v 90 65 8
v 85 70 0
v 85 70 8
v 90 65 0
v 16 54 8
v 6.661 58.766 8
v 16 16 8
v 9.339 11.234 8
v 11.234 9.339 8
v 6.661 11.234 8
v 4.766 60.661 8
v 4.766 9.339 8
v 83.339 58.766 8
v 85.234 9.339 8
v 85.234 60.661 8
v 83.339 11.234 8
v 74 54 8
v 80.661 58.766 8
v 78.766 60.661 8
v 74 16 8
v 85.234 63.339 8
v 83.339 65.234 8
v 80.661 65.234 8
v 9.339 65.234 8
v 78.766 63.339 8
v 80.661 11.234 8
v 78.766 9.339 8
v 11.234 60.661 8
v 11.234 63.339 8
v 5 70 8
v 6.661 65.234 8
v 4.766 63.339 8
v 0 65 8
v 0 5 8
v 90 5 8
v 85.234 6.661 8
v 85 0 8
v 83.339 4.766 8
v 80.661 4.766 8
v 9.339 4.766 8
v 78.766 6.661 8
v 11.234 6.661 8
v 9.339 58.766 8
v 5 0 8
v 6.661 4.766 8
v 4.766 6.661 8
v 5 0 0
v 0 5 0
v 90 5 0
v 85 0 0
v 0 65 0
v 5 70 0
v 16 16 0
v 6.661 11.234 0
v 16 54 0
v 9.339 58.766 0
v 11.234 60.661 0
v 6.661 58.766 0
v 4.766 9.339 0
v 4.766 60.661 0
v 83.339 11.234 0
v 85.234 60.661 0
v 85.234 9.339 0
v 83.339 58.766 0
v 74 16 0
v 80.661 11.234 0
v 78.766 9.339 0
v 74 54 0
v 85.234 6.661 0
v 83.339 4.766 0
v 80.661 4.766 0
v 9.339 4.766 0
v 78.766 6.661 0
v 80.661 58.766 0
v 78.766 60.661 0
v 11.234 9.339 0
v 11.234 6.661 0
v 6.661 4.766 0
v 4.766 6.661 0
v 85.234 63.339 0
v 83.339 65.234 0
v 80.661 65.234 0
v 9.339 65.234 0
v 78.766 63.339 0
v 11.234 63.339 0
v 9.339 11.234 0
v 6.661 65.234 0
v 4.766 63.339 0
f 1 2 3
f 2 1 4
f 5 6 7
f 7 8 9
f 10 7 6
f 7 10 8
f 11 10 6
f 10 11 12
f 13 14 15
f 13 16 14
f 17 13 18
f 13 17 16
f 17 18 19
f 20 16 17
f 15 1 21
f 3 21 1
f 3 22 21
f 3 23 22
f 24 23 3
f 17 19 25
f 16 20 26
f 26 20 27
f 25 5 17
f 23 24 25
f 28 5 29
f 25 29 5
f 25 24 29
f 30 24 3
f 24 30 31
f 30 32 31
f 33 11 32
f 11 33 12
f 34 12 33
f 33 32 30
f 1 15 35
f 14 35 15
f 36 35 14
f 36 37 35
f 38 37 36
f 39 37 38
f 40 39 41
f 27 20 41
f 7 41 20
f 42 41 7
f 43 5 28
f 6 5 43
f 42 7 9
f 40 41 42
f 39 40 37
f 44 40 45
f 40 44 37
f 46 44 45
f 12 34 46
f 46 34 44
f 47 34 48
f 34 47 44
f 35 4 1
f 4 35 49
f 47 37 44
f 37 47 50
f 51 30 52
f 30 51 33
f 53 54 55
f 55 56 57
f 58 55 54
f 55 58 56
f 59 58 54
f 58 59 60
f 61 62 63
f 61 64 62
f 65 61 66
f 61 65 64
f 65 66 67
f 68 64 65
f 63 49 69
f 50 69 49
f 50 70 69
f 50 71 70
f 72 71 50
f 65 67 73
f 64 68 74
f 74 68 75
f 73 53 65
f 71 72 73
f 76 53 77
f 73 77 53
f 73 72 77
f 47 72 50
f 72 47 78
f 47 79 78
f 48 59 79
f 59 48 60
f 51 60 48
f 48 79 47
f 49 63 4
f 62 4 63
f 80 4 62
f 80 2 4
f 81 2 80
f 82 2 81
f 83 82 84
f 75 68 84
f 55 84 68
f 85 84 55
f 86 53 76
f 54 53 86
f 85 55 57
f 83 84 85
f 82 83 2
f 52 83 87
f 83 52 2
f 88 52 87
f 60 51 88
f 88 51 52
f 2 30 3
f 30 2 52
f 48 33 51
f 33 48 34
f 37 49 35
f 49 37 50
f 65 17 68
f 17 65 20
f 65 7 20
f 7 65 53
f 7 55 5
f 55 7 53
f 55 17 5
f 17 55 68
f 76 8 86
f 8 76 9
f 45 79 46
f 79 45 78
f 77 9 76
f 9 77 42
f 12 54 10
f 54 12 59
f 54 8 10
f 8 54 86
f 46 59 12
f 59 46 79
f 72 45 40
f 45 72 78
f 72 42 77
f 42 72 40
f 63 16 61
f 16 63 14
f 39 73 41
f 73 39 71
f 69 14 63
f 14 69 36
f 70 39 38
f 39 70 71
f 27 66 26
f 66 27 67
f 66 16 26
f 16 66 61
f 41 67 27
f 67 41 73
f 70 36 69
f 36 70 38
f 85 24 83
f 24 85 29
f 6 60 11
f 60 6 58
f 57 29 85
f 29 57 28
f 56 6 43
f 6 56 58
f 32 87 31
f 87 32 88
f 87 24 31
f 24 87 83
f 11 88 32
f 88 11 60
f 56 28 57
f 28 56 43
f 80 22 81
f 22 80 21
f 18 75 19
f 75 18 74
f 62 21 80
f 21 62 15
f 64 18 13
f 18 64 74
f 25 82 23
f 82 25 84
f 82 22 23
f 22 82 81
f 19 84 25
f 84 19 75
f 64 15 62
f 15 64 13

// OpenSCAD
$fn = 32;

// ----------------------------------------------------------------------
// Frame plate: 90 x 70 frame, 16 mm rails
// ----------------------------------------------------------------------

// --- parameters (mm) ---
plate_l = 90;             // plate length, X
plate_w = 70;             // plate width, Y
plate_t = 8;              // plate thickness, Z (extrusion height)
corner_c = 5;             // corner chamfer
frame_bar = 16;           // frame rail width
bolt_r = 3.5;             // corner bolt window radius
bolt_inset = 8;           // bolt centre inset from the edges

win_l = plate_l - 2 * frame_bar;  // window length
win_w = plate_w - 2 * frame_bar;  // window width
bolt_d = 2 * bolt_r;  // corner hole diameter

profile = [[5, 0], [85, 0], [90, 5], [90, 65], [85, 70], [5, 70], [0, 65], [0, 5]];  // primary outline, 8 points, counter clockwise
void_1 = [[16, 16], [74, 16], [74, 54], [16, 54]];  // the window, 4 points
void_2 = [[11.234, 9.339], [9.339, 11.234], [6.661, 11.234], [4.766, 9.339], [4.766, 6.661], [6.661, 4.766], [9.339, 4.766], [11.234, 6.661]];  // corner bolt window, 8 points
void_3 = [[85.234, 9.339], [83.339, 11.234], [80.661, 11.234], [78.766, 9.339], [78.766, 6.661], [80.661, 4.766], [83.339, 4.766], [85.234, 6.661]];  // corner bolt window, 8 points
void_4 = [[11.234, 63.339], [9.339, 65.234], [6.661, 65.234], [4.766, 63.339], [4.766, 60.661], [6.661, 58.766], [9.339, 58.766], [11.234, 60.661]];  // corner bolt window, 8 points
void_5 = [[85.234, 63.339], [83.339, 65.234], [80.661, 65.234], [78.766, 63.339], [78.766, 60.661], [80.661, 58.766], [83.339, 58.766], [85.234, 60.661]];  // corner bolt window, 8 points

// --- the one profile operation ---
difference() {
  linear_extrude(height = plate_t) polygon(points = profile);
  translate([0, 0, -1])
    linear_extrude(height = plate_t + 2) polygon(points = void_1);
  translate([0, 0, -1])
    linear_extrude(height = plate_t + 2) polygon(points = void_2);
  translate([0, 0, -1])
    linear_extrude(height = plate_t + 2) polygon(points = void_3);
  translate([0, 0, -1])
    linear_extrude(height = plate_t + 2) polygon(points = void_4);
  translate([0, 0, -1])
    linear_extrude(height = plate_t + 2) polygon(points = void_5);
}
